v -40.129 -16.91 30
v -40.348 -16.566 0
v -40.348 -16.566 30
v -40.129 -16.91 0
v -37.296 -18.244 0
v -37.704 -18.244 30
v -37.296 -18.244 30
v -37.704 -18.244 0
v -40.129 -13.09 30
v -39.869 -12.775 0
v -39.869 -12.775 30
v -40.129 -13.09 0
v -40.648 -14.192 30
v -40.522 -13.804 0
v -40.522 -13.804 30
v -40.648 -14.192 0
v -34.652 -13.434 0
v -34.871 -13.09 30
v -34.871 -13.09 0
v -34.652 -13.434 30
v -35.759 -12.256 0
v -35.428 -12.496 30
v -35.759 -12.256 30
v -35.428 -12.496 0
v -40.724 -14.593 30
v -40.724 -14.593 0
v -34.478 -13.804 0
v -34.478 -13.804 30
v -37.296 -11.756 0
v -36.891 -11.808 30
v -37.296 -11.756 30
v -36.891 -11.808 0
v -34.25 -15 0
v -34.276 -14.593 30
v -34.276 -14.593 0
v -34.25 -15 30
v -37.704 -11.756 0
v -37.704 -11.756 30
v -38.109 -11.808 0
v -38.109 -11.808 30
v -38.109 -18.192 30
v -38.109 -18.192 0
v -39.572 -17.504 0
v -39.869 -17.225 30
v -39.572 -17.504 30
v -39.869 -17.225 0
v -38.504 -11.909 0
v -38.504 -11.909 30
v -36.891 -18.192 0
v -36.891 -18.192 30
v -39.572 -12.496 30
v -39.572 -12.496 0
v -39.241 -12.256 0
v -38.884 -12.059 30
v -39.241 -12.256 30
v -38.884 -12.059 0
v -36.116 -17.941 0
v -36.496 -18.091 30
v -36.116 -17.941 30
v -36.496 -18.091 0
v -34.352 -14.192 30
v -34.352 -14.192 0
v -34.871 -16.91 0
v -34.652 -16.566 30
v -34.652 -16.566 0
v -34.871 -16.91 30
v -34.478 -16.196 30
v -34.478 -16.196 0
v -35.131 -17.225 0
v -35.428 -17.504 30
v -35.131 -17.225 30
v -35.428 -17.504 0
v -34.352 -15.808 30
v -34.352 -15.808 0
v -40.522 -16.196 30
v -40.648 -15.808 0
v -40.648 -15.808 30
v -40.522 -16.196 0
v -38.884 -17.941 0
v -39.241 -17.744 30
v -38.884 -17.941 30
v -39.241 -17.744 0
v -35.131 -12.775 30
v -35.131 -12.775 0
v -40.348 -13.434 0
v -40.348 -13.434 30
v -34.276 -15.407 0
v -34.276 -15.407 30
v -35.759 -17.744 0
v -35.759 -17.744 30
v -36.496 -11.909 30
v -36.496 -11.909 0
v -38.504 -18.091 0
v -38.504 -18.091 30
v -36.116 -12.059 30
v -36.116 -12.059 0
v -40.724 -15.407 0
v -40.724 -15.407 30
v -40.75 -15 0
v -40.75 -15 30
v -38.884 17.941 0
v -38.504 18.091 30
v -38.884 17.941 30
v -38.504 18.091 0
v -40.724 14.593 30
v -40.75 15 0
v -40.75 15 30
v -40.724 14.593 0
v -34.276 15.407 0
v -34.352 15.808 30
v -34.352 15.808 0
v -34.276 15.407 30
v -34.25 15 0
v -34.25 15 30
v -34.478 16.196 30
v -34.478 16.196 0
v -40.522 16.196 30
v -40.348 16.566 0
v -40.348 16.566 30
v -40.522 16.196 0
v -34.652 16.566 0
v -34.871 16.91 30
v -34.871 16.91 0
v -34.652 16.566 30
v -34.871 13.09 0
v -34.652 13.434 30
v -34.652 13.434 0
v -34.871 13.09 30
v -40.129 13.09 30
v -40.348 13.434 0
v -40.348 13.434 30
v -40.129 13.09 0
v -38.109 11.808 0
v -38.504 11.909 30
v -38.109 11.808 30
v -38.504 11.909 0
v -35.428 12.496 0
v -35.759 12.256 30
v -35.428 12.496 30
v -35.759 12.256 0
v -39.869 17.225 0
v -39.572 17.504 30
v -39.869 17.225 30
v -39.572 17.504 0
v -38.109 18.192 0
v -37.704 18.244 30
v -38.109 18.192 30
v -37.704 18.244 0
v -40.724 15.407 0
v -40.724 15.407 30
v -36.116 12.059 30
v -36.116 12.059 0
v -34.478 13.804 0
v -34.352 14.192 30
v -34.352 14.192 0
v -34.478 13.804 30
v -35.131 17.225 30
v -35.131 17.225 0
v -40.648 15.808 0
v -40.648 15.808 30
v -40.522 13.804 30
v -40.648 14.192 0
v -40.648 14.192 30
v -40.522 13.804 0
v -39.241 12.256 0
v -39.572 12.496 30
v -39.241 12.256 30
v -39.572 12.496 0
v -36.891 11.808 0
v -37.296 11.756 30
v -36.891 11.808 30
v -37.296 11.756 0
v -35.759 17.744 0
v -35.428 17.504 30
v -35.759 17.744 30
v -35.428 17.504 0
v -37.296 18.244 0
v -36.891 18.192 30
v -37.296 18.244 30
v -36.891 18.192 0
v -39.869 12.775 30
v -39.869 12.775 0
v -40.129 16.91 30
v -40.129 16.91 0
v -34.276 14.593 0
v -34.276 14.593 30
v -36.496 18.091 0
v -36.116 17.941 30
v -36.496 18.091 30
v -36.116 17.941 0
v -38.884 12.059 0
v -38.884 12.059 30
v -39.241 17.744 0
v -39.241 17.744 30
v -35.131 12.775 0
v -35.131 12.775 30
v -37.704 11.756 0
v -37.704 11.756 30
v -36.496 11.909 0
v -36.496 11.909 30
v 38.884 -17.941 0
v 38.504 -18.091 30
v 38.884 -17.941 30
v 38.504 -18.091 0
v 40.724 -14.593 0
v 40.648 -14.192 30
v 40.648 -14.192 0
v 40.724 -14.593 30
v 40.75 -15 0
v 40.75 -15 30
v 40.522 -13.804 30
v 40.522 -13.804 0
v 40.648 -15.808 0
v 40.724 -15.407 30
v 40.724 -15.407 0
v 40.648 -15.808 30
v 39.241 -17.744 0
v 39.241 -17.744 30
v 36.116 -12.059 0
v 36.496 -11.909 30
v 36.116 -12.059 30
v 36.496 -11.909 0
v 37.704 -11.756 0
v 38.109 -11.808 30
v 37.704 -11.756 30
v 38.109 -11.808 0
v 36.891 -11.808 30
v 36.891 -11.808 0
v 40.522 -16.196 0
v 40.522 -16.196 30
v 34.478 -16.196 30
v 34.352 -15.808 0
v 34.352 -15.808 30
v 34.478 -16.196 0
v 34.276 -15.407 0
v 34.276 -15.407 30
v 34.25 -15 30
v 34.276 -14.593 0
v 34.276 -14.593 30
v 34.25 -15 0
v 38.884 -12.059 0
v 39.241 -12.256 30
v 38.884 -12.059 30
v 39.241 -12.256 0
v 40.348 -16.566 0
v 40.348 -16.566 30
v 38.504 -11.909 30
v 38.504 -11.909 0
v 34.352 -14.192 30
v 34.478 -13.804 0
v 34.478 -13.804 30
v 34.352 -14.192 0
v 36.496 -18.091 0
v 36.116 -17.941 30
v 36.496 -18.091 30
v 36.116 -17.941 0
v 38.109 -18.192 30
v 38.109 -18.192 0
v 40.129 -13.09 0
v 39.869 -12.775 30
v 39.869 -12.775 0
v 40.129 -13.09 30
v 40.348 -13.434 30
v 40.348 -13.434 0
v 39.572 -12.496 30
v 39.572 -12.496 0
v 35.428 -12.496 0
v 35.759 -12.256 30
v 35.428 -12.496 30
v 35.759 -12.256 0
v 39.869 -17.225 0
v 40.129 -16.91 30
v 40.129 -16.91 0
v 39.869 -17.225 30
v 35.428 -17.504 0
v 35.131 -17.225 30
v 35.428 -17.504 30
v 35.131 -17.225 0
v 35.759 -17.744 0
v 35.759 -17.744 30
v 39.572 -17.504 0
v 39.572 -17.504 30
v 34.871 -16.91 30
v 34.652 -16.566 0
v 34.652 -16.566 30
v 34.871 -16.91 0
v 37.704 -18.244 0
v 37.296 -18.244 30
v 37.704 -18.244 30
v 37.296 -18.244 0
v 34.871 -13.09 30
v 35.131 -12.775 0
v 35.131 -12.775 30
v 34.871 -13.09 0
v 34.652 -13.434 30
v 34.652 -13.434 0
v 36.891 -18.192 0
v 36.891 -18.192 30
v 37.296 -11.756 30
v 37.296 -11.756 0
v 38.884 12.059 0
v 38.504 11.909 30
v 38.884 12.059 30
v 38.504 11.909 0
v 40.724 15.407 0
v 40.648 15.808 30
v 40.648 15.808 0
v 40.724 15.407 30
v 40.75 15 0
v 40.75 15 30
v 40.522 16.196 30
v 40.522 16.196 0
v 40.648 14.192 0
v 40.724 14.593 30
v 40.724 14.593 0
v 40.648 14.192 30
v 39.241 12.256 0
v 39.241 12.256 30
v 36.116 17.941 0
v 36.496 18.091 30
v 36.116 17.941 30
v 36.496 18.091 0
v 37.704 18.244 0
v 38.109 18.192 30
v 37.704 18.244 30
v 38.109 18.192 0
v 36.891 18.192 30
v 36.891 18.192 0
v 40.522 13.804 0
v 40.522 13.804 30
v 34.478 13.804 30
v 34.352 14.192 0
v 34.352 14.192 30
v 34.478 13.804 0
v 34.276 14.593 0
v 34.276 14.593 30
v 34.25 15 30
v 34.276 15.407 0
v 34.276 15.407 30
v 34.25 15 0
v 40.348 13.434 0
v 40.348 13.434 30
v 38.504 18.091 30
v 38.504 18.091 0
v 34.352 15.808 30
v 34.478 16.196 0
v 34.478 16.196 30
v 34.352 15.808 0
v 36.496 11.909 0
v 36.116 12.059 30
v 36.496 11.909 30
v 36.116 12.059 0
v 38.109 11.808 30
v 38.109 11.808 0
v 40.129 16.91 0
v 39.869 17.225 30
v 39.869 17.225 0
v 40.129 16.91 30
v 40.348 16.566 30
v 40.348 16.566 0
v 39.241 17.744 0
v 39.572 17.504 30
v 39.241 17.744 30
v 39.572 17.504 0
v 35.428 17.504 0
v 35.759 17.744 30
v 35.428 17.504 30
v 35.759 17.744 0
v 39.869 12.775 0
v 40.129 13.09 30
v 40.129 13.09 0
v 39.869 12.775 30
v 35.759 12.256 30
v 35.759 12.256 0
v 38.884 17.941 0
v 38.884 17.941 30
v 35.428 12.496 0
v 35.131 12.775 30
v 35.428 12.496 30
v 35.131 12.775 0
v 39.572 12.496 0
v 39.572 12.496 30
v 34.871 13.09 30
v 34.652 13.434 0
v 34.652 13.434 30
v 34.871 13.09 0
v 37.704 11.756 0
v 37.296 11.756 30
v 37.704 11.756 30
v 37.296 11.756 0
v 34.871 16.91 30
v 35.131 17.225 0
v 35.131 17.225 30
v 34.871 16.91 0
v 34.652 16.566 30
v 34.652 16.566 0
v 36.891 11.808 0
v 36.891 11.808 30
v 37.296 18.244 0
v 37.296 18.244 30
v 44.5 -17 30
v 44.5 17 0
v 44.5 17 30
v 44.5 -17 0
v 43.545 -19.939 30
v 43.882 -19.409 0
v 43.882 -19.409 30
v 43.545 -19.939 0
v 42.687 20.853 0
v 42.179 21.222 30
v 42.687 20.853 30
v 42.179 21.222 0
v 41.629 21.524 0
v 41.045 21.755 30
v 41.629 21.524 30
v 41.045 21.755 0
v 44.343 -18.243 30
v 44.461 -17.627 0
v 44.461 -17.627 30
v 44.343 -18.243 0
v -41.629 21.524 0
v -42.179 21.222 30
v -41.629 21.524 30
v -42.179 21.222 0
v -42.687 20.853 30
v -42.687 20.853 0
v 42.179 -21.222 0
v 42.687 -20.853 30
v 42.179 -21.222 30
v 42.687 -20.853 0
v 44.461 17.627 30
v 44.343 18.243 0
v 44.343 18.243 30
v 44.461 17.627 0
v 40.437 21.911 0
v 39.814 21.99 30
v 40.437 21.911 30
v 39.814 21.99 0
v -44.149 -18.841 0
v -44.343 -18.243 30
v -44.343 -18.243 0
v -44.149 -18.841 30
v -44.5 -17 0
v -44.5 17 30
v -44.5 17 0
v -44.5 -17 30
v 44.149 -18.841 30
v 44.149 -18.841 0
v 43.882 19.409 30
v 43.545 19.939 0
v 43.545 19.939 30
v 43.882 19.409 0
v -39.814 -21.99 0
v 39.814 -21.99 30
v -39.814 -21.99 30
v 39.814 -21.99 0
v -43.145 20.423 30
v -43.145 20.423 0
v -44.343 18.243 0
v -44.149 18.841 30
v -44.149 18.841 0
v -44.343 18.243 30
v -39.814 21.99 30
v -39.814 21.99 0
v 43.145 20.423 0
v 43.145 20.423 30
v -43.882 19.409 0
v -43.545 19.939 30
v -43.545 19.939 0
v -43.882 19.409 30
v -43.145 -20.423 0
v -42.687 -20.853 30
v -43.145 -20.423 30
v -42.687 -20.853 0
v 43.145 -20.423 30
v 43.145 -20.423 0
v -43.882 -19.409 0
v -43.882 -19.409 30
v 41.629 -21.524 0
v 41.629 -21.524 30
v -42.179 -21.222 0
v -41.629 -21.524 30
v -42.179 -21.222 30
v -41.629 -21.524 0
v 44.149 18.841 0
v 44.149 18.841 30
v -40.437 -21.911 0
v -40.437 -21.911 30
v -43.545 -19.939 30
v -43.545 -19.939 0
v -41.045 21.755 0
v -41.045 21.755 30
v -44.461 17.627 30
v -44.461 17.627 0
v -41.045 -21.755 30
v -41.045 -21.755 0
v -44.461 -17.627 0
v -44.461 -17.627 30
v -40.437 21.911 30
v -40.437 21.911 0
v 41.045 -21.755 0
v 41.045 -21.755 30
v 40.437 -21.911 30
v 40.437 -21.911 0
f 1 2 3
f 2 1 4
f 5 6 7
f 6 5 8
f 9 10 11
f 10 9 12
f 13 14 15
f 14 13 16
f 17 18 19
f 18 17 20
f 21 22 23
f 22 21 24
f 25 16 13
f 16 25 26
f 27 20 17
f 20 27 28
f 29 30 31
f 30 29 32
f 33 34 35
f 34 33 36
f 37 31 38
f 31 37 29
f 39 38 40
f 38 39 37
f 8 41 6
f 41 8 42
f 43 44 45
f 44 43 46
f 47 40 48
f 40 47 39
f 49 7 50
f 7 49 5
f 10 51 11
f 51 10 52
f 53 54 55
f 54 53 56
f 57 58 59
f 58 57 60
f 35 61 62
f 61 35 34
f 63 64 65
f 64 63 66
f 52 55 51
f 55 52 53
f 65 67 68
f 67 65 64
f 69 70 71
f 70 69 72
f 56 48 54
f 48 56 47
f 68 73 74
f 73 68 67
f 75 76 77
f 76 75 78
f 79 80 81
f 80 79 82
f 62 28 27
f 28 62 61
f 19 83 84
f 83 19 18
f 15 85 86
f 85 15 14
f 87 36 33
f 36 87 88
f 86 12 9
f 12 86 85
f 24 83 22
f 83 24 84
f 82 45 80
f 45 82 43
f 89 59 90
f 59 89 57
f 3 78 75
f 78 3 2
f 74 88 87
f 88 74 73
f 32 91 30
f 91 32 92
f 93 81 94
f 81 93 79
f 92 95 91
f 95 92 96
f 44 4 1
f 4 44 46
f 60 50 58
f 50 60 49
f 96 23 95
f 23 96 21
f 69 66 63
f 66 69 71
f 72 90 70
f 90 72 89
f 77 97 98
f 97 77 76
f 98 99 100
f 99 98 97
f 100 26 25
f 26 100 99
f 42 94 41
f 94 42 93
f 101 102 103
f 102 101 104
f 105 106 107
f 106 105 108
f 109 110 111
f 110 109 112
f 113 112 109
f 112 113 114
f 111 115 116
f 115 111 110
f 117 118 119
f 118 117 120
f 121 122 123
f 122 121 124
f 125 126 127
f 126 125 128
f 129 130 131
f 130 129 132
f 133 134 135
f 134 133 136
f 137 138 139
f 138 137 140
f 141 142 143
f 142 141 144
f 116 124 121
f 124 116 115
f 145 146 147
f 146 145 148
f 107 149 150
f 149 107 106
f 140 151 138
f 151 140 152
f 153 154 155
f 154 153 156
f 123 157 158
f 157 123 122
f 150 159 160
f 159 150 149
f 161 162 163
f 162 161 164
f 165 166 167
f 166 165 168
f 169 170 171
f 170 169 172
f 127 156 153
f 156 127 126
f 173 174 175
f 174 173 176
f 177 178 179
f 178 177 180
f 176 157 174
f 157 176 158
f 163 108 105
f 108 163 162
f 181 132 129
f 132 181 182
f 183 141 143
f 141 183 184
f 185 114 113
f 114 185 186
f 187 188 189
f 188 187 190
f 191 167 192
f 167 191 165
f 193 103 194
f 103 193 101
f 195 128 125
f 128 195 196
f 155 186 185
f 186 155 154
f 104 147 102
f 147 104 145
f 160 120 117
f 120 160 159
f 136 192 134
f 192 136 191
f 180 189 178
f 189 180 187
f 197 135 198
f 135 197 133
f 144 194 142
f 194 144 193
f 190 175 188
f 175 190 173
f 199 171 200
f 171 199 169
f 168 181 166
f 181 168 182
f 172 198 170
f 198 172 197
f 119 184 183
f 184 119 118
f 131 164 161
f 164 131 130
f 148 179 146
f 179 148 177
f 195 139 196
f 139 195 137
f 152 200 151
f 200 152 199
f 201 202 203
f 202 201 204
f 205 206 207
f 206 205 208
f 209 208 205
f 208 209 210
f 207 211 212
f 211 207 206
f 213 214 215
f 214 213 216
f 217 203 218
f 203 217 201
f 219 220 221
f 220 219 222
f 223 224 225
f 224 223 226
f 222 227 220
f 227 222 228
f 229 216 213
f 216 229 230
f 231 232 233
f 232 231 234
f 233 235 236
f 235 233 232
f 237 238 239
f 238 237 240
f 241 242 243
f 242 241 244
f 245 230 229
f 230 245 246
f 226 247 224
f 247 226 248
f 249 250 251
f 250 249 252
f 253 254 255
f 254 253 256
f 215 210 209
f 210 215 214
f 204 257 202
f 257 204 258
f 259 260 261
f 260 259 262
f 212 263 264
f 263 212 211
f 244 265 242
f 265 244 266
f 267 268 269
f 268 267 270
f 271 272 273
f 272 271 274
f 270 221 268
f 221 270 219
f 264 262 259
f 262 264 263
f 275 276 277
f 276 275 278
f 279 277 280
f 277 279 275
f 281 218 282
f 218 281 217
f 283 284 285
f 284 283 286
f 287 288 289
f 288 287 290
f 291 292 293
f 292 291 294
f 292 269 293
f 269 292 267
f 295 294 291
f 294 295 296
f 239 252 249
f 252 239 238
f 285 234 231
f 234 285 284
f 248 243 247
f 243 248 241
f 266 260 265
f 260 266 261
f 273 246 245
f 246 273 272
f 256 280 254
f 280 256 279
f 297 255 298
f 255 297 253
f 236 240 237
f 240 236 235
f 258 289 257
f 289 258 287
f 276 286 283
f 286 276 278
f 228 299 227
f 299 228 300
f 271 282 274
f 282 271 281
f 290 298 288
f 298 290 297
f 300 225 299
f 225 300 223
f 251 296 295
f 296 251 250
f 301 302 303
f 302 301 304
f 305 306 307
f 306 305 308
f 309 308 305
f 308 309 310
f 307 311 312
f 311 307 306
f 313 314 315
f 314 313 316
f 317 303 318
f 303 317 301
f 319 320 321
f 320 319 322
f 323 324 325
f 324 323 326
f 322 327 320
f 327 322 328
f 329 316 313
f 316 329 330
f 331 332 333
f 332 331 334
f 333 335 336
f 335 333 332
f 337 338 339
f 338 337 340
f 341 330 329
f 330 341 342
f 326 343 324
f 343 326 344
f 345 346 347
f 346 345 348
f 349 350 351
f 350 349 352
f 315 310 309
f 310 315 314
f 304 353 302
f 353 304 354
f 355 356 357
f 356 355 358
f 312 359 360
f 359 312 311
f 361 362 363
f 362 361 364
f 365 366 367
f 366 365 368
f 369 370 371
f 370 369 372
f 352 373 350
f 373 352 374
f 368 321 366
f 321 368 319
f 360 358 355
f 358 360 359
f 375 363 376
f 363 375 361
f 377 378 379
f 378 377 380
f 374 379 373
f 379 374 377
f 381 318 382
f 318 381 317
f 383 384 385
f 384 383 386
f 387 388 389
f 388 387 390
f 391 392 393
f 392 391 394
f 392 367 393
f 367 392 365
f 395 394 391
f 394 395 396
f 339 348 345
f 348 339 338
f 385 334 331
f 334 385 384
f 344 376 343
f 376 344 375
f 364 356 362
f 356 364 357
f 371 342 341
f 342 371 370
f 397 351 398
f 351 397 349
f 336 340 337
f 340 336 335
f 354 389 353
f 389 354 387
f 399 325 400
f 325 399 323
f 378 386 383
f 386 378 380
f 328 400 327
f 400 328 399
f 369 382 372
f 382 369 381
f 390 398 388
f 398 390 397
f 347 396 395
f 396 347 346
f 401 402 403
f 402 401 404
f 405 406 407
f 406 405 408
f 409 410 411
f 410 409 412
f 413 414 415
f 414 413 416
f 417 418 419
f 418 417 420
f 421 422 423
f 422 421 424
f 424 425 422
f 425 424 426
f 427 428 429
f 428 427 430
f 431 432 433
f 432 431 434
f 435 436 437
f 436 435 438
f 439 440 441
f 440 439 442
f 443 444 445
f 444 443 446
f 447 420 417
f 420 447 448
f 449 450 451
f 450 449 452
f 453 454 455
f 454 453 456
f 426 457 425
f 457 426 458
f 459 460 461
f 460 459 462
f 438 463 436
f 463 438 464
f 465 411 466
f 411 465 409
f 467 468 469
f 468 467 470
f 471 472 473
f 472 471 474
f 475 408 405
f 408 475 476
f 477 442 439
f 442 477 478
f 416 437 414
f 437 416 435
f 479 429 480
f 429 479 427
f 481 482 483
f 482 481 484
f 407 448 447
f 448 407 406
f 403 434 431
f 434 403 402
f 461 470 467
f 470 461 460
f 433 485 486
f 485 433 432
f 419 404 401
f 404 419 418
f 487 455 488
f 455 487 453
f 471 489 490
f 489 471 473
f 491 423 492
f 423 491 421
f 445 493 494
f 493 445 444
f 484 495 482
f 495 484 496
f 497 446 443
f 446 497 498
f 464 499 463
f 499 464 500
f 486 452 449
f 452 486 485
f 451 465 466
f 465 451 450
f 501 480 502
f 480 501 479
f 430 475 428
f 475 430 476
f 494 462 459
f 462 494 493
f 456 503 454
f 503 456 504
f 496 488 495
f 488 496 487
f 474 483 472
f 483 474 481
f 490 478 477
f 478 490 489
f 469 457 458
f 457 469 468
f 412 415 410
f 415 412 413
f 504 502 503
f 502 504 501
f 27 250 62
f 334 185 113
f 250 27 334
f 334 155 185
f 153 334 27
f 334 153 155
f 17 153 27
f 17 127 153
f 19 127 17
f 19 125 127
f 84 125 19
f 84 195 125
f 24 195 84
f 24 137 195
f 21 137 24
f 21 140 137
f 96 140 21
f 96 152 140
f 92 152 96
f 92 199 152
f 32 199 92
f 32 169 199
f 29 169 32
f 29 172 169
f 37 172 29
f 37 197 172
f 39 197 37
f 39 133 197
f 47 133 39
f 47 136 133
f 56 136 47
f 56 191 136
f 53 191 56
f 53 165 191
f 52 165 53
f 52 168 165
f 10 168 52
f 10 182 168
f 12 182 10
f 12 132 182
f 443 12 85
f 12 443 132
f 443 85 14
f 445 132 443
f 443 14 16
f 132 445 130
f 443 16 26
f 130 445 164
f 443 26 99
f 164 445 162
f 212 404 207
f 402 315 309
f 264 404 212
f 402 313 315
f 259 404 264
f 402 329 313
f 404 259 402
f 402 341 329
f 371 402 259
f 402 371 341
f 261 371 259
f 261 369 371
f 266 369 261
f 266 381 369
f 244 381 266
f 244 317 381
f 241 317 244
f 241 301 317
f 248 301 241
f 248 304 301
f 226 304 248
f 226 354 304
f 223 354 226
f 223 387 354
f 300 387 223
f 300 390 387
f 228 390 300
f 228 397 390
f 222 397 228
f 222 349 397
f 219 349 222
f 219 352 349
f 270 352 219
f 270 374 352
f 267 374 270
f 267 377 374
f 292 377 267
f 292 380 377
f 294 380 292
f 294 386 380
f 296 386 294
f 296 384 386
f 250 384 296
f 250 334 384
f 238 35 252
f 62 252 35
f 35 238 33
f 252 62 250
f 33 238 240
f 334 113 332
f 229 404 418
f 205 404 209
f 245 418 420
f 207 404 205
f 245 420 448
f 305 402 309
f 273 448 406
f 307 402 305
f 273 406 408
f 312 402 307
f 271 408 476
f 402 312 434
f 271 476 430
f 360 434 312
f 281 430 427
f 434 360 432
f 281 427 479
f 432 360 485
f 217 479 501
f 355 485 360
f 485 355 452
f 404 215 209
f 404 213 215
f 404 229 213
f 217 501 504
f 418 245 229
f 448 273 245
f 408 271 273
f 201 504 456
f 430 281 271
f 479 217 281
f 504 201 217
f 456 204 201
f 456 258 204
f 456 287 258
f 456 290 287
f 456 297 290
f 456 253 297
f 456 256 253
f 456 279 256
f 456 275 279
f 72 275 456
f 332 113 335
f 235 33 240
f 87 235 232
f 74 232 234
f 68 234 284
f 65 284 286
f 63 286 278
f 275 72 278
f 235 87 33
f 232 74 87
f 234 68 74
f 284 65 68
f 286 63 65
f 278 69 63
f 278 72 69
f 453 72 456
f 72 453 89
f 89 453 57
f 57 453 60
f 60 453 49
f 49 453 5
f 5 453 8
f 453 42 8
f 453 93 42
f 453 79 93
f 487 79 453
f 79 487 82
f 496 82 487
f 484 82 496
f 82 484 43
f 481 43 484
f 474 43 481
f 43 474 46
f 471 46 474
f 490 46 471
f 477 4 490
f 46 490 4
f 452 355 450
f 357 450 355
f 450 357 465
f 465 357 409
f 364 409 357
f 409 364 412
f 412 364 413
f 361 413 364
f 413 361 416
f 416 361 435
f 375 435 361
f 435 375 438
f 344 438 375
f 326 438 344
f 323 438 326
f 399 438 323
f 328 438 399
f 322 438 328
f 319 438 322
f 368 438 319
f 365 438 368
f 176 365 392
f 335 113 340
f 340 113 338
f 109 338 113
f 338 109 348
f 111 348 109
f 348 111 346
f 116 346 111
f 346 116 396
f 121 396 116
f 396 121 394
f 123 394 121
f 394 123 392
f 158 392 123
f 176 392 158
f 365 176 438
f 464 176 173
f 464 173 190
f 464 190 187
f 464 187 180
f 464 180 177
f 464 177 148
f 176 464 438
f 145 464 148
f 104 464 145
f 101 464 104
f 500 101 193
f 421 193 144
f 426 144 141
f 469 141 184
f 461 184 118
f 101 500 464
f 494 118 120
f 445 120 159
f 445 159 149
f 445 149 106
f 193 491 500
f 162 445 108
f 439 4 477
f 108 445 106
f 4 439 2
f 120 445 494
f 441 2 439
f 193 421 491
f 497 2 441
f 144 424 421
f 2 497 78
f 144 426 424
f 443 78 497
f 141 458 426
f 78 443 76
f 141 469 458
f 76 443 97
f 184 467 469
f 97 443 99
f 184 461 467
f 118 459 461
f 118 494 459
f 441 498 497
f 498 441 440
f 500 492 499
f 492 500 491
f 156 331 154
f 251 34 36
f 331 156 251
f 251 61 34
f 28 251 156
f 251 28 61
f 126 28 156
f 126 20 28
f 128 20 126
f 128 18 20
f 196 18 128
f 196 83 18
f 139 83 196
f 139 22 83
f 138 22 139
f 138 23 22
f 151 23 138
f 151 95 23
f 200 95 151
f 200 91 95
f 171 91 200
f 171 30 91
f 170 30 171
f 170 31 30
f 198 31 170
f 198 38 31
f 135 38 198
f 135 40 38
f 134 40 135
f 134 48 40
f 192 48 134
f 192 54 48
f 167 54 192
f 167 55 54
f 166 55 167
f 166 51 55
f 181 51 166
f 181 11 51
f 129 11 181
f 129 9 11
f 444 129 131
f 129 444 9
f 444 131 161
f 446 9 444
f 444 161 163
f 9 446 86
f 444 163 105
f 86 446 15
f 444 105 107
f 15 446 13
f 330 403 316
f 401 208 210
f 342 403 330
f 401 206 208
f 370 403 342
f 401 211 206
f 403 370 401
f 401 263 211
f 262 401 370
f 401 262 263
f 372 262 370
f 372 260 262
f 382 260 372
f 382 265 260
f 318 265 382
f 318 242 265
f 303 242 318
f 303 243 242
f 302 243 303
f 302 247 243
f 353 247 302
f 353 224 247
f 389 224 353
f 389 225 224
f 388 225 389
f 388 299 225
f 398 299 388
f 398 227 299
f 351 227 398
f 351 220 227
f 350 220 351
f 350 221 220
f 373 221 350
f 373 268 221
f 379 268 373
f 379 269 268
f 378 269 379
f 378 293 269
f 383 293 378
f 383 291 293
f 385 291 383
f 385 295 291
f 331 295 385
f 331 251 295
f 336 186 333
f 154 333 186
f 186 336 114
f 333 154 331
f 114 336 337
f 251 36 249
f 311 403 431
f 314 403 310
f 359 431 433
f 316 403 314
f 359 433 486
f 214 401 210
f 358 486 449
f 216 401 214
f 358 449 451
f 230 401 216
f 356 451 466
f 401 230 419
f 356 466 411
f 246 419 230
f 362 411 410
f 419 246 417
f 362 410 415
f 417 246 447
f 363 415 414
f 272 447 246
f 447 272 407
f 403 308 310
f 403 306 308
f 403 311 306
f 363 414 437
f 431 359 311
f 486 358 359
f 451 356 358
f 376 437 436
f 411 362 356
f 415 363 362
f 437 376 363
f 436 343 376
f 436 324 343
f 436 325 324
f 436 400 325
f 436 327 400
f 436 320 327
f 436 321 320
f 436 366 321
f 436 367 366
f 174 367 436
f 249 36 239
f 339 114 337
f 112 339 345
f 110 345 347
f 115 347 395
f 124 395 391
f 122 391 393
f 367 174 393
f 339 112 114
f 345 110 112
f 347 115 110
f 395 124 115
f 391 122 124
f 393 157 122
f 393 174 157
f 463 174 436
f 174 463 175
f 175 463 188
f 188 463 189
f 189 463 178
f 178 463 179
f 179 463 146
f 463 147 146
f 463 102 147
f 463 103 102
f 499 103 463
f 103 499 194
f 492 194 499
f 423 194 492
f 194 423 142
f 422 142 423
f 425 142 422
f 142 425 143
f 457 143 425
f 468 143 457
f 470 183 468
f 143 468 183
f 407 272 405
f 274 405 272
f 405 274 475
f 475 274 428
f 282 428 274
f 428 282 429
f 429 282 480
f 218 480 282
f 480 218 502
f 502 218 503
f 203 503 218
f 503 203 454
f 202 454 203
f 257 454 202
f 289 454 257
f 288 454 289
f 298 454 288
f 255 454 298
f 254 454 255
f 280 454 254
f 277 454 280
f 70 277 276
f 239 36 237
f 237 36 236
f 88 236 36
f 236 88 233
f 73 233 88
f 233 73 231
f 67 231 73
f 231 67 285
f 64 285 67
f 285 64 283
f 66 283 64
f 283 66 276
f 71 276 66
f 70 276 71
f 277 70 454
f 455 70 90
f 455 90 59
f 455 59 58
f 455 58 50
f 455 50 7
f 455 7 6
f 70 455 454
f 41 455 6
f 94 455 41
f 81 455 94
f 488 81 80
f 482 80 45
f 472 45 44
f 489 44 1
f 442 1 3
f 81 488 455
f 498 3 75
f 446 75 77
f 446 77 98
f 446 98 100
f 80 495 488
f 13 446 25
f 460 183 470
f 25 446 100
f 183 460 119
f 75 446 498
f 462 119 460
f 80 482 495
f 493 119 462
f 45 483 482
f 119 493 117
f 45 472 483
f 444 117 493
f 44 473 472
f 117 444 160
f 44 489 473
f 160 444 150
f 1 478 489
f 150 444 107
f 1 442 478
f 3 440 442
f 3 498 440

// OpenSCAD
$fn = 50;


difference() {
	union() {
		hull() {
			translate(v = [-39.5000000000, 17.0000000000, 0]) {
				cylinder(h = 30, r = 5);
			}
			translate(v = [39.5000000000, 17.0000000000, 0]) {
				cylinder(h = 30, r = 5);
			}
			translate(v = [-39.5000000000, -17.0000000000, 0]) {
				cylinder(h = 30, r = 5);
			}
			translate(v = [39.5000000000, -17.0000000000, 0]) {
				cylinder(h = 30, r = 5);
			}
		}
	}
	union() {
		translate(v = [-37.5000000000, -15.0000000000, -100.0000000000]) {
			cylinder(h = 200, r = 3.2500000000);
		}
		translate(v = [-37.5000000000, 15.0000000000, -100.0000000000]) {
			cylinder(h = 200, r = 3.2500000000);
		}
		translate(v = [37.5000000000, -15.0000000000, -100.0000000000]) {
			cylinder(h = 200, r = 3.2500000000);
		}
		translate(v = [37.5000000000, 15.0000000000, -100.0000000000]) {
			cylinder(h = 200, r = 3.2500000000);
		}
	}
}
